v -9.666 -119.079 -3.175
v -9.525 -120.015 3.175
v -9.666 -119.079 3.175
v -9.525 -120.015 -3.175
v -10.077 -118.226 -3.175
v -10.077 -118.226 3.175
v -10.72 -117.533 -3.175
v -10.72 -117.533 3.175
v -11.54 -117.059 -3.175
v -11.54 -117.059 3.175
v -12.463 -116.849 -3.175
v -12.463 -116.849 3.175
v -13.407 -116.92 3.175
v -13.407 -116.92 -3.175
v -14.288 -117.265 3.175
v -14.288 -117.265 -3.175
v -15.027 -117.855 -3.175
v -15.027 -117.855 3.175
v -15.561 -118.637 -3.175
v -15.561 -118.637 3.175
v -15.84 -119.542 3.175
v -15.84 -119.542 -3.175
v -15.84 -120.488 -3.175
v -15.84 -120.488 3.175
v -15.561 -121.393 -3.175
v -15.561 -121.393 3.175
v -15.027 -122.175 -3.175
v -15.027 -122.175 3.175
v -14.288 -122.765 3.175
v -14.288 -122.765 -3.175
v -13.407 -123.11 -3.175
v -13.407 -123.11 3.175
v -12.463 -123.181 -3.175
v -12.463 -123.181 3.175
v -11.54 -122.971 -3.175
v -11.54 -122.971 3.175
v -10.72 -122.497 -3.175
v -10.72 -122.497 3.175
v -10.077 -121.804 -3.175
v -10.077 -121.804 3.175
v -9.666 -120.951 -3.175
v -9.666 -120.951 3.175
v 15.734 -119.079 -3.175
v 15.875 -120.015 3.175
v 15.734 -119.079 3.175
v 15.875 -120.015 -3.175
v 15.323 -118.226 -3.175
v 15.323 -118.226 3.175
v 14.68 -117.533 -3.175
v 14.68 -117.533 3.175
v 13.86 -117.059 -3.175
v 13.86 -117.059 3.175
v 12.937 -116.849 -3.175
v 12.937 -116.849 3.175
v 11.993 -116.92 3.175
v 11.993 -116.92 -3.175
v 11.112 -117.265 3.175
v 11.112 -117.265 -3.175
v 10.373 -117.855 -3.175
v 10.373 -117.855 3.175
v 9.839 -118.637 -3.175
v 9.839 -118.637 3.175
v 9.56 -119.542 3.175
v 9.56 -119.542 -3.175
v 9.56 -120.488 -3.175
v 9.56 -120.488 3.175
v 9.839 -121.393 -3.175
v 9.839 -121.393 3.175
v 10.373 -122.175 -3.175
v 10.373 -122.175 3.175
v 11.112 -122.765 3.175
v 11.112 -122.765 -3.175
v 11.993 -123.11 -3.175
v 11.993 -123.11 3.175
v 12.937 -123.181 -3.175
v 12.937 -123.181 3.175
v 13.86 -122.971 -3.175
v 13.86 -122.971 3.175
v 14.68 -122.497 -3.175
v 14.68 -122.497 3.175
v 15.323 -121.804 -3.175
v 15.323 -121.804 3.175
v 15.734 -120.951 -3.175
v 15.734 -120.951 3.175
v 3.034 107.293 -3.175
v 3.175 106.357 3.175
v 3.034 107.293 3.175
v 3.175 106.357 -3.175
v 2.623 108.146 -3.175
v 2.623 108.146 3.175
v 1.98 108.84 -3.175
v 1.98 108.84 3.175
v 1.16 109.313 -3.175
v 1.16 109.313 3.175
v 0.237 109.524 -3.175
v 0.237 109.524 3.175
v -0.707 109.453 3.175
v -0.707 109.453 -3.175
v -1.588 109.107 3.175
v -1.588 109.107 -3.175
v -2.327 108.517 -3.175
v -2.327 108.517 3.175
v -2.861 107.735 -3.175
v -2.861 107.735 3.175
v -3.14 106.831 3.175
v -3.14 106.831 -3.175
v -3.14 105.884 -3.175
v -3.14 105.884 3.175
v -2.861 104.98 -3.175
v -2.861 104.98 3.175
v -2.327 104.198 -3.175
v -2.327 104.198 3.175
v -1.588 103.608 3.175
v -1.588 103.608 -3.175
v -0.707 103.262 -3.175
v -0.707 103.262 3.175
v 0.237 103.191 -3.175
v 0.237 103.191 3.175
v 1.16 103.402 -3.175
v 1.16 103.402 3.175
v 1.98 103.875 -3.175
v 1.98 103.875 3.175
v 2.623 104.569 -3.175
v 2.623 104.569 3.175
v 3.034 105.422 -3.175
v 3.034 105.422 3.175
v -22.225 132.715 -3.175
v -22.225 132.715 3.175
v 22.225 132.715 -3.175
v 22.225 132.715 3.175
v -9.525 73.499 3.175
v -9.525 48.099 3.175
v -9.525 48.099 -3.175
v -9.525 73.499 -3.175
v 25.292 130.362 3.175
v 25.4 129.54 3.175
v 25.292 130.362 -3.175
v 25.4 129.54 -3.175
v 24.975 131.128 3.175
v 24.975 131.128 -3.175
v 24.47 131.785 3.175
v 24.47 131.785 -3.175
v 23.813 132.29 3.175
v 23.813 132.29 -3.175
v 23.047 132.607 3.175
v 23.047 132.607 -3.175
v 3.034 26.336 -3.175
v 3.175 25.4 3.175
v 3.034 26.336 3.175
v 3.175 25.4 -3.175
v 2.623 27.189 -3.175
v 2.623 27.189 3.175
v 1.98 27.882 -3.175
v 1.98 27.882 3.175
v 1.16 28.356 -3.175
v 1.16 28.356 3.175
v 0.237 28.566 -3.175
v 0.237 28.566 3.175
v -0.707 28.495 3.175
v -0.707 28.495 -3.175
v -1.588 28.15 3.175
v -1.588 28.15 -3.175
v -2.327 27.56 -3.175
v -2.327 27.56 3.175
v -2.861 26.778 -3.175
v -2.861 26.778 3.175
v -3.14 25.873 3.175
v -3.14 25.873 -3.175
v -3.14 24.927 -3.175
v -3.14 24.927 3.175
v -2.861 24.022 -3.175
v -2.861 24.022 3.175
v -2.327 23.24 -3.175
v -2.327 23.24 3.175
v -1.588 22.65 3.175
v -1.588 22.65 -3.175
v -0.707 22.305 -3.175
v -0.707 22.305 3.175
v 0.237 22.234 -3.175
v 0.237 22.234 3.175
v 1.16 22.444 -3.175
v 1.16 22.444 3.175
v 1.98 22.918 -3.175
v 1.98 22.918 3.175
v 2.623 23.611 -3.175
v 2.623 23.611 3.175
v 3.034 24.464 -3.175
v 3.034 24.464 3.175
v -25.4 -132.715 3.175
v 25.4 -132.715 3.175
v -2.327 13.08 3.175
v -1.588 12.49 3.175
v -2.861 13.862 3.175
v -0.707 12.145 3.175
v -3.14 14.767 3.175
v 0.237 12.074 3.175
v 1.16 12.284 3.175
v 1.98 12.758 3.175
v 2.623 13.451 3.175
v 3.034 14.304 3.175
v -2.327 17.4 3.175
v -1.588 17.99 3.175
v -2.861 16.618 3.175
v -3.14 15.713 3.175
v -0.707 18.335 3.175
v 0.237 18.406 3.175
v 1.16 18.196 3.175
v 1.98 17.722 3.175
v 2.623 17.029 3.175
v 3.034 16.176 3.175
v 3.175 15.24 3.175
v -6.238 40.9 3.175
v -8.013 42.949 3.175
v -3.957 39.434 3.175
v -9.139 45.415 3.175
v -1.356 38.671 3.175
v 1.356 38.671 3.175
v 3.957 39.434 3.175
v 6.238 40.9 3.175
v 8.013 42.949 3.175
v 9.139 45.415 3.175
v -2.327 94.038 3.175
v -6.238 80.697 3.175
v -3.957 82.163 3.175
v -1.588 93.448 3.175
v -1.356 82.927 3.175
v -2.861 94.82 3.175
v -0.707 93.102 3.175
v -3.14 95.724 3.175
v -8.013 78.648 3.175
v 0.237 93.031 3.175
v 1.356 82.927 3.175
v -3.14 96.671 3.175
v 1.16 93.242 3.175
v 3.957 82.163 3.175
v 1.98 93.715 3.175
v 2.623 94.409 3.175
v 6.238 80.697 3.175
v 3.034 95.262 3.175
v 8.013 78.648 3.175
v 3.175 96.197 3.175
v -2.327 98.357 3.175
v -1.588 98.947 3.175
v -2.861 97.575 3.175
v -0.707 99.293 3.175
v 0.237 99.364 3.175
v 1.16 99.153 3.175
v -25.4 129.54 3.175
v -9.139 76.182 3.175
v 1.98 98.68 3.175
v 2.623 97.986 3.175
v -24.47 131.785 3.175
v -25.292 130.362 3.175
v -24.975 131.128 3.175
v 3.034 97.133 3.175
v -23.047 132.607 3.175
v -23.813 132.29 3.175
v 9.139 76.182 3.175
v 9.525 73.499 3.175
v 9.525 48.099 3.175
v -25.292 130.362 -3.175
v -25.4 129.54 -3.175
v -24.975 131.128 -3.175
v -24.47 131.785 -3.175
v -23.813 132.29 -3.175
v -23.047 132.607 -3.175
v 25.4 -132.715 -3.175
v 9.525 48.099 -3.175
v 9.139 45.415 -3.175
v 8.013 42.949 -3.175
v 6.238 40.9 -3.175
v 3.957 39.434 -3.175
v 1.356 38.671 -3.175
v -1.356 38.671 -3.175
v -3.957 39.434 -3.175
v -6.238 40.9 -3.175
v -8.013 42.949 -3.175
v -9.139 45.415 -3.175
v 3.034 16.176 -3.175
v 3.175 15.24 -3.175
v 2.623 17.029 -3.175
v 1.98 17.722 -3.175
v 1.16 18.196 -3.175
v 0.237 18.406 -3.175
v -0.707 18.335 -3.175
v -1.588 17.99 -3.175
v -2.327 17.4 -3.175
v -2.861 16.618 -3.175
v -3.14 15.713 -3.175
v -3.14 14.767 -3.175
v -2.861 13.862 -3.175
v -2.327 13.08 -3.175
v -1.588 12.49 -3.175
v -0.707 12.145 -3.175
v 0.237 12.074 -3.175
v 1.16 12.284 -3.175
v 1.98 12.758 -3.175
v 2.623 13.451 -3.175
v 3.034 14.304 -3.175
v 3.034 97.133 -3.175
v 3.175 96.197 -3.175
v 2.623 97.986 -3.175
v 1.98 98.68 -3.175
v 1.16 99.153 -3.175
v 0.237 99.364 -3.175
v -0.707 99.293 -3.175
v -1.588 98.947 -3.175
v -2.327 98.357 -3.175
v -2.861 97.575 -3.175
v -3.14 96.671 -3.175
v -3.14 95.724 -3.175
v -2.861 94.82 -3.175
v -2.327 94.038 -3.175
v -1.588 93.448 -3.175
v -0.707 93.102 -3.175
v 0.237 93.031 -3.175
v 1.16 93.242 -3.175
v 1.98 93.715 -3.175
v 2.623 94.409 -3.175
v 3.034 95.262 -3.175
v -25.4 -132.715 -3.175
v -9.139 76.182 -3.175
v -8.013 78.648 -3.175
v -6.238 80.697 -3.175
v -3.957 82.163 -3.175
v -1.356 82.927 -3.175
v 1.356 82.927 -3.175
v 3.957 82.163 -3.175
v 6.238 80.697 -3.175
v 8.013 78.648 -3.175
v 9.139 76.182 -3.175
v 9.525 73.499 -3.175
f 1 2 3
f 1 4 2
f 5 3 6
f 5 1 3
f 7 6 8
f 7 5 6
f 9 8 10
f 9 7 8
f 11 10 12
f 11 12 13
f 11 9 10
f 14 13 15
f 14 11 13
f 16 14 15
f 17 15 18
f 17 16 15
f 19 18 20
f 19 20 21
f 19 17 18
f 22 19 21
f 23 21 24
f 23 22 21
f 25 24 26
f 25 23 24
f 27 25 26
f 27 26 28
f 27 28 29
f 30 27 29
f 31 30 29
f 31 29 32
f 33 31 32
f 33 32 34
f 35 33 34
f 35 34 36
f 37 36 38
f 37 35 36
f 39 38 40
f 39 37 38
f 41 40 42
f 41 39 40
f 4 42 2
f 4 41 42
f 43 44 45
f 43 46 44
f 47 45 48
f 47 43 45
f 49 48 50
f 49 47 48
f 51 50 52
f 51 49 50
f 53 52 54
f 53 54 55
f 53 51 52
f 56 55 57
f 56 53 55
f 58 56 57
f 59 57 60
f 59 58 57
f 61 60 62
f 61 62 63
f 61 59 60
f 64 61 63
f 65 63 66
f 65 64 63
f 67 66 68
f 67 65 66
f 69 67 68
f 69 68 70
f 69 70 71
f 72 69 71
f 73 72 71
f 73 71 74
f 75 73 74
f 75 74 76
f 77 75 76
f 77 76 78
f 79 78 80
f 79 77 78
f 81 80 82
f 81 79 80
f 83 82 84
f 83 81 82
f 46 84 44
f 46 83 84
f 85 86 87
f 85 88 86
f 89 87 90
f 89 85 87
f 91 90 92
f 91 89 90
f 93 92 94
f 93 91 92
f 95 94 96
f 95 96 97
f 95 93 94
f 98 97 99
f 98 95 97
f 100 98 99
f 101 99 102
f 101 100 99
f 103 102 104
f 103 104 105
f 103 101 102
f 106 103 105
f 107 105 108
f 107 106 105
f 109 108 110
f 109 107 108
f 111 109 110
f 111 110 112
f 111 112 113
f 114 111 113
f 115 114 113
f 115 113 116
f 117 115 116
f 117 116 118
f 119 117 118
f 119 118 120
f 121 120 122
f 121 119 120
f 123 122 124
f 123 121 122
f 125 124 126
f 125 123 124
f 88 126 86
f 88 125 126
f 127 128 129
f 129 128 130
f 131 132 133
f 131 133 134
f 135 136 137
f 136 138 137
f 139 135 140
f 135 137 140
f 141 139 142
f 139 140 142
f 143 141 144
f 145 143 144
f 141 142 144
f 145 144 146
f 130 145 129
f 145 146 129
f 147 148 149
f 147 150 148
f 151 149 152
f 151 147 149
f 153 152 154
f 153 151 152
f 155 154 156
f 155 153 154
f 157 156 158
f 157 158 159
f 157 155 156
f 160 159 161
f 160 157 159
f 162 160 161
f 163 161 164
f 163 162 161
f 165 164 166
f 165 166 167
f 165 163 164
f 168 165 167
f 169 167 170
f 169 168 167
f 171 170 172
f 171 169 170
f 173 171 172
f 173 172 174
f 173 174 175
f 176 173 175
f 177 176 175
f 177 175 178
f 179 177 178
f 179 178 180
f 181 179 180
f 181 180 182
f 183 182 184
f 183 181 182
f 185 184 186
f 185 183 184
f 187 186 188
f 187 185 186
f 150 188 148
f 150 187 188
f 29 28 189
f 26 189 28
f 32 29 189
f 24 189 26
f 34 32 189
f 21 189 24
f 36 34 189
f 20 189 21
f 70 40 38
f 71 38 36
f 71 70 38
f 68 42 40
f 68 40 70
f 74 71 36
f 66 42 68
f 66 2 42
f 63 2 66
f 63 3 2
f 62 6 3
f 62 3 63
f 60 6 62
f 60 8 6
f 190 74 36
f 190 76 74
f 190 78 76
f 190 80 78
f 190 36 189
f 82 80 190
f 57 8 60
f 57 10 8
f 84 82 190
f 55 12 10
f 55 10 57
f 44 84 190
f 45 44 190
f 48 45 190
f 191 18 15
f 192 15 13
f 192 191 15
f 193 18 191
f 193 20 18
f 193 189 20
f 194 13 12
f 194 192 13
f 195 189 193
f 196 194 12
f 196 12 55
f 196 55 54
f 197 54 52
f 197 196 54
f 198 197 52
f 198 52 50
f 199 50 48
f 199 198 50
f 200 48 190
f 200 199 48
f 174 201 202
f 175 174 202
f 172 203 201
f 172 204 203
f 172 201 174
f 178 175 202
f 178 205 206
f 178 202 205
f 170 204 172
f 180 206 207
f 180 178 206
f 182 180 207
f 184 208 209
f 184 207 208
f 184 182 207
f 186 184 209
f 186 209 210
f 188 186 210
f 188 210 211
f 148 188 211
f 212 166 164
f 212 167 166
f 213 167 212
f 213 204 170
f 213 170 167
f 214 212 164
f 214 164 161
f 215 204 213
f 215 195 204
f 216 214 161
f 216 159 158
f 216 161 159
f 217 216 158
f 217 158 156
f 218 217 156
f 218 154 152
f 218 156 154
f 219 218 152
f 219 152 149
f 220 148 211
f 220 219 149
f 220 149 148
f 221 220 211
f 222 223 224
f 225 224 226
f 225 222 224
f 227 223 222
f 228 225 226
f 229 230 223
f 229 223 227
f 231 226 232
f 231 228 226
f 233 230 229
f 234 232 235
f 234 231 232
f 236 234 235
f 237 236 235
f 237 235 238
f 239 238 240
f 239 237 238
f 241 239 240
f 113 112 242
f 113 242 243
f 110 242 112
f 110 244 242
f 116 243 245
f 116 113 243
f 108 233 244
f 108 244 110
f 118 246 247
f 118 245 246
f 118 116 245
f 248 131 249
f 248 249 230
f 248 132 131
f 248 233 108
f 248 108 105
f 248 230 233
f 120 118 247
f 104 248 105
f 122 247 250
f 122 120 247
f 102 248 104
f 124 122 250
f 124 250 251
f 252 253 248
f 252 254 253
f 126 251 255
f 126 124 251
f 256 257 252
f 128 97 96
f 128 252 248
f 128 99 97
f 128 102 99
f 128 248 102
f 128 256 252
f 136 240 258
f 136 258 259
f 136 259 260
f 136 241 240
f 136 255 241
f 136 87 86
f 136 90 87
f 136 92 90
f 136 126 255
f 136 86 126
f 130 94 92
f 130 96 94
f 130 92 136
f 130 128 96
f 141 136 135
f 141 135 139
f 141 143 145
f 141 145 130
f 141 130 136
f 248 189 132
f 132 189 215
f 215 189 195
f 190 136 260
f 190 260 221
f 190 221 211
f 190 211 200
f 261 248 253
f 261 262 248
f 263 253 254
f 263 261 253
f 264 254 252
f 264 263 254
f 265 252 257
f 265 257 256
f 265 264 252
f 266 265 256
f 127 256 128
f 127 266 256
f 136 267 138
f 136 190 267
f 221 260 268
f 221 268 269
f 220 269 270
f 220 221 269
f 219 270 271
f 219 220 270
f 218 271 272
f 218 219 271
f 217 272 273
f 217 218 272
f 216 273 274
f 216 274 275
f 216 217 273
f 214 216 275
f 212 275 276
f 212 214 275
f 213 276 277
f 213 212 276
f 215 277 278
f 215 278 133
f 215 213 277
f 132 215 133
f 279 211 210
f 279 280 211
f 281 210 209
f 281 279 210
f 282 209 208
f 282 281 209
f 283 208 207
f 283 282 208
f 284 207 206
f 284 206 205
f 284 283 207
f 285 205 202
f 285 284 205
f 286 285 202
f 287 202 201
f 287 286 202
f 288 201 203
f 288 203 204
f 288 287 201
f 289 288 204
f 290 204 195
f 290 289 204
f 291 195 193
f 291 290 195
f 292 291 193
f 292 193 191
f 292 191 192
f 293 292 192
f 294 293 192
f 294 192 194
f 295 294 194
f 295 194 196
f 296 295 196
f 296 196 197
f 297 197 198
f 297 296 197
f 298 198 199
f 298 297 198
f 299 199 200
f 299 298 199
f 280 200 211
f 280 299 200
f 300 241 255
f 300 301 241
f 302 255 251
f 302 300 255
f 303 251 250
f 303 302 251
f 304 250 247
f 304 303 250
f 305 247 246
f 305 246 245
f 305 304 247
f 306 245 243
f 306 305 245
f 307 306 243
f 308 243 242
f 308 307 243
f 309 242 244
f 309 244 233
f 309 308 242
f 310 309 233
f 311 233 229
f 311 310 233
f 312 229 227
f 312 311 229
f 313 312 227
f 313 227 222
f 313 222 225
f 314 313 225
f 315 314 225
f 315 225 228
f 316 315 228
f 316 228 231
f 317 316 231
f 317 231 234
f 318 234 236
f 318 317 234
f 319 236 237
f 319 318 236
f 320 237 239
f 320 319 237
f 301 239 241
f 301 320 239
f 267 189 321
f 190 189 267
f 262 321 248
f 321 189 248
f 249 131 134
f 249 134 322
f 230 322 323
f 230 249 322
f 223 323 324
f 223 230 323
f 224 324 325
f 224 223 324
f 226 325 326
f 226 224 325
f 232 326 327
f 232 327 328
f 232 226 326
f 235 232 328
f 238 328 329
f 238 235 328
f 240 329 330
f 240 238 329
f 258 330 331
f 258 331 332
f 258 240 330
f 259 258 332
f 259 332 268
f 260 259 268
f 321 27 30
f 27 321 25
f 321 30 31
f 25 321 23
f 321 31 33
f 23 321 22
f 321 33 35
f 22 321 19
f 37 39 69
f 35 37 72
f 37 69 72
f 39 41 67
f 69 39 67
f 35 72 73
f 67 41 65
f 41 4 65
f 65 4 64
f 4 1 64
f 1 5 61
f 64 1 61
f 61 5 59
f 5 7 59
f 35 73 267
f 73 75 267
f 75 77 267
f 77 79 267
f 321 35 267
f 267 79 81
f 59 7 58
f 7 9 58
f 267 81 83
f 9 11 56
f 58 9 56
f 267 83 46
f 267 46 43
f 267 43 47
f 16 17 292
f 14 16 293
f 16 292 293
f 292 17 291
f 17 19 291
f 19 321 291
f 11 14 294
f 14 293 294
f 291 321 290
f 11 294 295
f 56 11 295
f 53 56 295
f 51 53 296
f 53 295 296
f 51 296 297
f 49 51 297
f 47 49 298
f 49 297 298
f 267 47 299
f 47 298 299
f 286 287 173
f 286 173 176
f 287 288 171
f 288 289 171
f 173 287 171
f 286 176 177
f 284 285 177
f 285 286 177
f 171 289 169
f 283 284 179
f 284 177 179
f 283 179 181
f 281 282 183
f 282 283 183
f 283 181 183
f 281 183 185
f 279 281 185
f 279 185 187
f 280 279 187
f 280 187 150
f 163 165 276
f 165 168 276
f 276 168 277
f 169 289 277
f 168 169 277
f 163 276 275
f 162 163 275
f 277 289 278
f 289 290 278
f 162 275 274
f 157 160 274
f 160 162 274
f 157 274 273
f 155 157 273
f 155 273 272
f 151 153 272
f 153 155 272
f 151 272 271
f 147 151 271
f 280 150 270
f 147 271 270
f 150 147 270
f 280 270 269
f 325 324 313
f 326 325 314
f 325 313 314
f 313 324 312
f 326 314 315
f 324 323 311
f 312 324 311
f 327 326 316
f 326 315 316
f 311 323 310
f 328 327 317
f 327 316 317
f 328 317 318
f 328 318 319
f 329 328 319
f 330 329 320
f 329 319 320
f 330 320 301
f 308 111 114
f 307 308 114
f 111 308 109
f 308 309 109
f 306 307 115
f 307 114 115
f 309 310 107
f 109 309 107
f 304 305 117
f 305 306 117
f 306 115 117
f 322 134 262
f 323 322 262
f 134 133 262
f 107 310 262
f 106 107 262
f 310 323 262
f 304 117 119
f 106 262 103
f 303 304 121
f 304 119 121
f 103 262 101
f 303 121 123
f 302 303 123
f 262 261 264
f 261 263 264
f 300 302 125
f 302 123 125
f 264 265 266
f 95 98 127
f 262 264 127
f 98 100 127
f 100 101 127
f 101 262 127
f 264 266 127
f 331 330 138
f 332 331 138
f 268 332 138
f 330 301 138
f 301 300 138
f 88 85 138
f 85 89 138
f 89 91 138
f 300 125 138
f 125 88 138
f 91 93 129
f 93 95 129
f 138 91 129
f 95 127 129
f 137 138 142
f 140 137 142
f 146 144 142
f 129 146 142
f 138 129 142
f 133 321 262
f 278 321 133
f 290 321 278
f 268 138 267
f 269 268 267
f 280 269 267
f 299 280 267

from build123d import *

# Parameters (mm, degrees)
SKETCH1_W      = 50.8
SKETCH1_H      = 265.43
SKETCH1_R      = 3.175
EXTRUDE1_DEPTH = 3.175
FILLET1_R      = 3.175


with BuildPart() as part:
    # Sketch1 → Extrude1 (new, symmetric)
    with BuildSketch(Plane.XY):
        Rectangle(SKETCH1_W, SKETCH1_H)
        with Locations((0, 106.35742)):
            Circle(SKETCH1_R, mode=Mode.SUBTRACT)
        with Locations((0, 96.19742)):
            Circle(SKETCH1_R, mode=Mode.SUBTRACT)
        with Locations((0, 15.24)):
            Circle(SKETCH1_R, mode=Mode.SUBTRACT)
        with Locations((0, 25.4)):
            Circle(SKETCH1_R, mode=Mode.SUBTRACT)
        with Locations((12.7, -120.015)):
            Circle(SKETCH1_R, mode=Mode.SUBTRACT)
        with Locations((-12.7, -120.015)):
            Circle(SKETCH1_R, mode=Mode.SUBTRACT)
        with BuildLine():
            Line((9.525, 73.49871), (9.525, 48.09871))
            ThreePointArc((9.525, 48.09871), (0, 38.57371), (-9.525, 48.09871))
            Line((-9.525, 48.09871), (-9.525, 73.49871))
            ThreePointArc((-9.525, 73.49871), (0, 83.02371), (9.525, 73.49871))
        make_face(mode=Mode.SUBTRACT)
    extrude(amount=EXTRUDE1_DEPTH, both=True)

    # Fillet1
    fillet1_edges = [part.edges().sort_by_distance(p)[0] for p in [
        (-25.4, 132.715, 0),
        (25.4, 132.715, 0),
    ]]
    fillet(fillet1_edges, radius=FILLET1_R)


solid = part.part
